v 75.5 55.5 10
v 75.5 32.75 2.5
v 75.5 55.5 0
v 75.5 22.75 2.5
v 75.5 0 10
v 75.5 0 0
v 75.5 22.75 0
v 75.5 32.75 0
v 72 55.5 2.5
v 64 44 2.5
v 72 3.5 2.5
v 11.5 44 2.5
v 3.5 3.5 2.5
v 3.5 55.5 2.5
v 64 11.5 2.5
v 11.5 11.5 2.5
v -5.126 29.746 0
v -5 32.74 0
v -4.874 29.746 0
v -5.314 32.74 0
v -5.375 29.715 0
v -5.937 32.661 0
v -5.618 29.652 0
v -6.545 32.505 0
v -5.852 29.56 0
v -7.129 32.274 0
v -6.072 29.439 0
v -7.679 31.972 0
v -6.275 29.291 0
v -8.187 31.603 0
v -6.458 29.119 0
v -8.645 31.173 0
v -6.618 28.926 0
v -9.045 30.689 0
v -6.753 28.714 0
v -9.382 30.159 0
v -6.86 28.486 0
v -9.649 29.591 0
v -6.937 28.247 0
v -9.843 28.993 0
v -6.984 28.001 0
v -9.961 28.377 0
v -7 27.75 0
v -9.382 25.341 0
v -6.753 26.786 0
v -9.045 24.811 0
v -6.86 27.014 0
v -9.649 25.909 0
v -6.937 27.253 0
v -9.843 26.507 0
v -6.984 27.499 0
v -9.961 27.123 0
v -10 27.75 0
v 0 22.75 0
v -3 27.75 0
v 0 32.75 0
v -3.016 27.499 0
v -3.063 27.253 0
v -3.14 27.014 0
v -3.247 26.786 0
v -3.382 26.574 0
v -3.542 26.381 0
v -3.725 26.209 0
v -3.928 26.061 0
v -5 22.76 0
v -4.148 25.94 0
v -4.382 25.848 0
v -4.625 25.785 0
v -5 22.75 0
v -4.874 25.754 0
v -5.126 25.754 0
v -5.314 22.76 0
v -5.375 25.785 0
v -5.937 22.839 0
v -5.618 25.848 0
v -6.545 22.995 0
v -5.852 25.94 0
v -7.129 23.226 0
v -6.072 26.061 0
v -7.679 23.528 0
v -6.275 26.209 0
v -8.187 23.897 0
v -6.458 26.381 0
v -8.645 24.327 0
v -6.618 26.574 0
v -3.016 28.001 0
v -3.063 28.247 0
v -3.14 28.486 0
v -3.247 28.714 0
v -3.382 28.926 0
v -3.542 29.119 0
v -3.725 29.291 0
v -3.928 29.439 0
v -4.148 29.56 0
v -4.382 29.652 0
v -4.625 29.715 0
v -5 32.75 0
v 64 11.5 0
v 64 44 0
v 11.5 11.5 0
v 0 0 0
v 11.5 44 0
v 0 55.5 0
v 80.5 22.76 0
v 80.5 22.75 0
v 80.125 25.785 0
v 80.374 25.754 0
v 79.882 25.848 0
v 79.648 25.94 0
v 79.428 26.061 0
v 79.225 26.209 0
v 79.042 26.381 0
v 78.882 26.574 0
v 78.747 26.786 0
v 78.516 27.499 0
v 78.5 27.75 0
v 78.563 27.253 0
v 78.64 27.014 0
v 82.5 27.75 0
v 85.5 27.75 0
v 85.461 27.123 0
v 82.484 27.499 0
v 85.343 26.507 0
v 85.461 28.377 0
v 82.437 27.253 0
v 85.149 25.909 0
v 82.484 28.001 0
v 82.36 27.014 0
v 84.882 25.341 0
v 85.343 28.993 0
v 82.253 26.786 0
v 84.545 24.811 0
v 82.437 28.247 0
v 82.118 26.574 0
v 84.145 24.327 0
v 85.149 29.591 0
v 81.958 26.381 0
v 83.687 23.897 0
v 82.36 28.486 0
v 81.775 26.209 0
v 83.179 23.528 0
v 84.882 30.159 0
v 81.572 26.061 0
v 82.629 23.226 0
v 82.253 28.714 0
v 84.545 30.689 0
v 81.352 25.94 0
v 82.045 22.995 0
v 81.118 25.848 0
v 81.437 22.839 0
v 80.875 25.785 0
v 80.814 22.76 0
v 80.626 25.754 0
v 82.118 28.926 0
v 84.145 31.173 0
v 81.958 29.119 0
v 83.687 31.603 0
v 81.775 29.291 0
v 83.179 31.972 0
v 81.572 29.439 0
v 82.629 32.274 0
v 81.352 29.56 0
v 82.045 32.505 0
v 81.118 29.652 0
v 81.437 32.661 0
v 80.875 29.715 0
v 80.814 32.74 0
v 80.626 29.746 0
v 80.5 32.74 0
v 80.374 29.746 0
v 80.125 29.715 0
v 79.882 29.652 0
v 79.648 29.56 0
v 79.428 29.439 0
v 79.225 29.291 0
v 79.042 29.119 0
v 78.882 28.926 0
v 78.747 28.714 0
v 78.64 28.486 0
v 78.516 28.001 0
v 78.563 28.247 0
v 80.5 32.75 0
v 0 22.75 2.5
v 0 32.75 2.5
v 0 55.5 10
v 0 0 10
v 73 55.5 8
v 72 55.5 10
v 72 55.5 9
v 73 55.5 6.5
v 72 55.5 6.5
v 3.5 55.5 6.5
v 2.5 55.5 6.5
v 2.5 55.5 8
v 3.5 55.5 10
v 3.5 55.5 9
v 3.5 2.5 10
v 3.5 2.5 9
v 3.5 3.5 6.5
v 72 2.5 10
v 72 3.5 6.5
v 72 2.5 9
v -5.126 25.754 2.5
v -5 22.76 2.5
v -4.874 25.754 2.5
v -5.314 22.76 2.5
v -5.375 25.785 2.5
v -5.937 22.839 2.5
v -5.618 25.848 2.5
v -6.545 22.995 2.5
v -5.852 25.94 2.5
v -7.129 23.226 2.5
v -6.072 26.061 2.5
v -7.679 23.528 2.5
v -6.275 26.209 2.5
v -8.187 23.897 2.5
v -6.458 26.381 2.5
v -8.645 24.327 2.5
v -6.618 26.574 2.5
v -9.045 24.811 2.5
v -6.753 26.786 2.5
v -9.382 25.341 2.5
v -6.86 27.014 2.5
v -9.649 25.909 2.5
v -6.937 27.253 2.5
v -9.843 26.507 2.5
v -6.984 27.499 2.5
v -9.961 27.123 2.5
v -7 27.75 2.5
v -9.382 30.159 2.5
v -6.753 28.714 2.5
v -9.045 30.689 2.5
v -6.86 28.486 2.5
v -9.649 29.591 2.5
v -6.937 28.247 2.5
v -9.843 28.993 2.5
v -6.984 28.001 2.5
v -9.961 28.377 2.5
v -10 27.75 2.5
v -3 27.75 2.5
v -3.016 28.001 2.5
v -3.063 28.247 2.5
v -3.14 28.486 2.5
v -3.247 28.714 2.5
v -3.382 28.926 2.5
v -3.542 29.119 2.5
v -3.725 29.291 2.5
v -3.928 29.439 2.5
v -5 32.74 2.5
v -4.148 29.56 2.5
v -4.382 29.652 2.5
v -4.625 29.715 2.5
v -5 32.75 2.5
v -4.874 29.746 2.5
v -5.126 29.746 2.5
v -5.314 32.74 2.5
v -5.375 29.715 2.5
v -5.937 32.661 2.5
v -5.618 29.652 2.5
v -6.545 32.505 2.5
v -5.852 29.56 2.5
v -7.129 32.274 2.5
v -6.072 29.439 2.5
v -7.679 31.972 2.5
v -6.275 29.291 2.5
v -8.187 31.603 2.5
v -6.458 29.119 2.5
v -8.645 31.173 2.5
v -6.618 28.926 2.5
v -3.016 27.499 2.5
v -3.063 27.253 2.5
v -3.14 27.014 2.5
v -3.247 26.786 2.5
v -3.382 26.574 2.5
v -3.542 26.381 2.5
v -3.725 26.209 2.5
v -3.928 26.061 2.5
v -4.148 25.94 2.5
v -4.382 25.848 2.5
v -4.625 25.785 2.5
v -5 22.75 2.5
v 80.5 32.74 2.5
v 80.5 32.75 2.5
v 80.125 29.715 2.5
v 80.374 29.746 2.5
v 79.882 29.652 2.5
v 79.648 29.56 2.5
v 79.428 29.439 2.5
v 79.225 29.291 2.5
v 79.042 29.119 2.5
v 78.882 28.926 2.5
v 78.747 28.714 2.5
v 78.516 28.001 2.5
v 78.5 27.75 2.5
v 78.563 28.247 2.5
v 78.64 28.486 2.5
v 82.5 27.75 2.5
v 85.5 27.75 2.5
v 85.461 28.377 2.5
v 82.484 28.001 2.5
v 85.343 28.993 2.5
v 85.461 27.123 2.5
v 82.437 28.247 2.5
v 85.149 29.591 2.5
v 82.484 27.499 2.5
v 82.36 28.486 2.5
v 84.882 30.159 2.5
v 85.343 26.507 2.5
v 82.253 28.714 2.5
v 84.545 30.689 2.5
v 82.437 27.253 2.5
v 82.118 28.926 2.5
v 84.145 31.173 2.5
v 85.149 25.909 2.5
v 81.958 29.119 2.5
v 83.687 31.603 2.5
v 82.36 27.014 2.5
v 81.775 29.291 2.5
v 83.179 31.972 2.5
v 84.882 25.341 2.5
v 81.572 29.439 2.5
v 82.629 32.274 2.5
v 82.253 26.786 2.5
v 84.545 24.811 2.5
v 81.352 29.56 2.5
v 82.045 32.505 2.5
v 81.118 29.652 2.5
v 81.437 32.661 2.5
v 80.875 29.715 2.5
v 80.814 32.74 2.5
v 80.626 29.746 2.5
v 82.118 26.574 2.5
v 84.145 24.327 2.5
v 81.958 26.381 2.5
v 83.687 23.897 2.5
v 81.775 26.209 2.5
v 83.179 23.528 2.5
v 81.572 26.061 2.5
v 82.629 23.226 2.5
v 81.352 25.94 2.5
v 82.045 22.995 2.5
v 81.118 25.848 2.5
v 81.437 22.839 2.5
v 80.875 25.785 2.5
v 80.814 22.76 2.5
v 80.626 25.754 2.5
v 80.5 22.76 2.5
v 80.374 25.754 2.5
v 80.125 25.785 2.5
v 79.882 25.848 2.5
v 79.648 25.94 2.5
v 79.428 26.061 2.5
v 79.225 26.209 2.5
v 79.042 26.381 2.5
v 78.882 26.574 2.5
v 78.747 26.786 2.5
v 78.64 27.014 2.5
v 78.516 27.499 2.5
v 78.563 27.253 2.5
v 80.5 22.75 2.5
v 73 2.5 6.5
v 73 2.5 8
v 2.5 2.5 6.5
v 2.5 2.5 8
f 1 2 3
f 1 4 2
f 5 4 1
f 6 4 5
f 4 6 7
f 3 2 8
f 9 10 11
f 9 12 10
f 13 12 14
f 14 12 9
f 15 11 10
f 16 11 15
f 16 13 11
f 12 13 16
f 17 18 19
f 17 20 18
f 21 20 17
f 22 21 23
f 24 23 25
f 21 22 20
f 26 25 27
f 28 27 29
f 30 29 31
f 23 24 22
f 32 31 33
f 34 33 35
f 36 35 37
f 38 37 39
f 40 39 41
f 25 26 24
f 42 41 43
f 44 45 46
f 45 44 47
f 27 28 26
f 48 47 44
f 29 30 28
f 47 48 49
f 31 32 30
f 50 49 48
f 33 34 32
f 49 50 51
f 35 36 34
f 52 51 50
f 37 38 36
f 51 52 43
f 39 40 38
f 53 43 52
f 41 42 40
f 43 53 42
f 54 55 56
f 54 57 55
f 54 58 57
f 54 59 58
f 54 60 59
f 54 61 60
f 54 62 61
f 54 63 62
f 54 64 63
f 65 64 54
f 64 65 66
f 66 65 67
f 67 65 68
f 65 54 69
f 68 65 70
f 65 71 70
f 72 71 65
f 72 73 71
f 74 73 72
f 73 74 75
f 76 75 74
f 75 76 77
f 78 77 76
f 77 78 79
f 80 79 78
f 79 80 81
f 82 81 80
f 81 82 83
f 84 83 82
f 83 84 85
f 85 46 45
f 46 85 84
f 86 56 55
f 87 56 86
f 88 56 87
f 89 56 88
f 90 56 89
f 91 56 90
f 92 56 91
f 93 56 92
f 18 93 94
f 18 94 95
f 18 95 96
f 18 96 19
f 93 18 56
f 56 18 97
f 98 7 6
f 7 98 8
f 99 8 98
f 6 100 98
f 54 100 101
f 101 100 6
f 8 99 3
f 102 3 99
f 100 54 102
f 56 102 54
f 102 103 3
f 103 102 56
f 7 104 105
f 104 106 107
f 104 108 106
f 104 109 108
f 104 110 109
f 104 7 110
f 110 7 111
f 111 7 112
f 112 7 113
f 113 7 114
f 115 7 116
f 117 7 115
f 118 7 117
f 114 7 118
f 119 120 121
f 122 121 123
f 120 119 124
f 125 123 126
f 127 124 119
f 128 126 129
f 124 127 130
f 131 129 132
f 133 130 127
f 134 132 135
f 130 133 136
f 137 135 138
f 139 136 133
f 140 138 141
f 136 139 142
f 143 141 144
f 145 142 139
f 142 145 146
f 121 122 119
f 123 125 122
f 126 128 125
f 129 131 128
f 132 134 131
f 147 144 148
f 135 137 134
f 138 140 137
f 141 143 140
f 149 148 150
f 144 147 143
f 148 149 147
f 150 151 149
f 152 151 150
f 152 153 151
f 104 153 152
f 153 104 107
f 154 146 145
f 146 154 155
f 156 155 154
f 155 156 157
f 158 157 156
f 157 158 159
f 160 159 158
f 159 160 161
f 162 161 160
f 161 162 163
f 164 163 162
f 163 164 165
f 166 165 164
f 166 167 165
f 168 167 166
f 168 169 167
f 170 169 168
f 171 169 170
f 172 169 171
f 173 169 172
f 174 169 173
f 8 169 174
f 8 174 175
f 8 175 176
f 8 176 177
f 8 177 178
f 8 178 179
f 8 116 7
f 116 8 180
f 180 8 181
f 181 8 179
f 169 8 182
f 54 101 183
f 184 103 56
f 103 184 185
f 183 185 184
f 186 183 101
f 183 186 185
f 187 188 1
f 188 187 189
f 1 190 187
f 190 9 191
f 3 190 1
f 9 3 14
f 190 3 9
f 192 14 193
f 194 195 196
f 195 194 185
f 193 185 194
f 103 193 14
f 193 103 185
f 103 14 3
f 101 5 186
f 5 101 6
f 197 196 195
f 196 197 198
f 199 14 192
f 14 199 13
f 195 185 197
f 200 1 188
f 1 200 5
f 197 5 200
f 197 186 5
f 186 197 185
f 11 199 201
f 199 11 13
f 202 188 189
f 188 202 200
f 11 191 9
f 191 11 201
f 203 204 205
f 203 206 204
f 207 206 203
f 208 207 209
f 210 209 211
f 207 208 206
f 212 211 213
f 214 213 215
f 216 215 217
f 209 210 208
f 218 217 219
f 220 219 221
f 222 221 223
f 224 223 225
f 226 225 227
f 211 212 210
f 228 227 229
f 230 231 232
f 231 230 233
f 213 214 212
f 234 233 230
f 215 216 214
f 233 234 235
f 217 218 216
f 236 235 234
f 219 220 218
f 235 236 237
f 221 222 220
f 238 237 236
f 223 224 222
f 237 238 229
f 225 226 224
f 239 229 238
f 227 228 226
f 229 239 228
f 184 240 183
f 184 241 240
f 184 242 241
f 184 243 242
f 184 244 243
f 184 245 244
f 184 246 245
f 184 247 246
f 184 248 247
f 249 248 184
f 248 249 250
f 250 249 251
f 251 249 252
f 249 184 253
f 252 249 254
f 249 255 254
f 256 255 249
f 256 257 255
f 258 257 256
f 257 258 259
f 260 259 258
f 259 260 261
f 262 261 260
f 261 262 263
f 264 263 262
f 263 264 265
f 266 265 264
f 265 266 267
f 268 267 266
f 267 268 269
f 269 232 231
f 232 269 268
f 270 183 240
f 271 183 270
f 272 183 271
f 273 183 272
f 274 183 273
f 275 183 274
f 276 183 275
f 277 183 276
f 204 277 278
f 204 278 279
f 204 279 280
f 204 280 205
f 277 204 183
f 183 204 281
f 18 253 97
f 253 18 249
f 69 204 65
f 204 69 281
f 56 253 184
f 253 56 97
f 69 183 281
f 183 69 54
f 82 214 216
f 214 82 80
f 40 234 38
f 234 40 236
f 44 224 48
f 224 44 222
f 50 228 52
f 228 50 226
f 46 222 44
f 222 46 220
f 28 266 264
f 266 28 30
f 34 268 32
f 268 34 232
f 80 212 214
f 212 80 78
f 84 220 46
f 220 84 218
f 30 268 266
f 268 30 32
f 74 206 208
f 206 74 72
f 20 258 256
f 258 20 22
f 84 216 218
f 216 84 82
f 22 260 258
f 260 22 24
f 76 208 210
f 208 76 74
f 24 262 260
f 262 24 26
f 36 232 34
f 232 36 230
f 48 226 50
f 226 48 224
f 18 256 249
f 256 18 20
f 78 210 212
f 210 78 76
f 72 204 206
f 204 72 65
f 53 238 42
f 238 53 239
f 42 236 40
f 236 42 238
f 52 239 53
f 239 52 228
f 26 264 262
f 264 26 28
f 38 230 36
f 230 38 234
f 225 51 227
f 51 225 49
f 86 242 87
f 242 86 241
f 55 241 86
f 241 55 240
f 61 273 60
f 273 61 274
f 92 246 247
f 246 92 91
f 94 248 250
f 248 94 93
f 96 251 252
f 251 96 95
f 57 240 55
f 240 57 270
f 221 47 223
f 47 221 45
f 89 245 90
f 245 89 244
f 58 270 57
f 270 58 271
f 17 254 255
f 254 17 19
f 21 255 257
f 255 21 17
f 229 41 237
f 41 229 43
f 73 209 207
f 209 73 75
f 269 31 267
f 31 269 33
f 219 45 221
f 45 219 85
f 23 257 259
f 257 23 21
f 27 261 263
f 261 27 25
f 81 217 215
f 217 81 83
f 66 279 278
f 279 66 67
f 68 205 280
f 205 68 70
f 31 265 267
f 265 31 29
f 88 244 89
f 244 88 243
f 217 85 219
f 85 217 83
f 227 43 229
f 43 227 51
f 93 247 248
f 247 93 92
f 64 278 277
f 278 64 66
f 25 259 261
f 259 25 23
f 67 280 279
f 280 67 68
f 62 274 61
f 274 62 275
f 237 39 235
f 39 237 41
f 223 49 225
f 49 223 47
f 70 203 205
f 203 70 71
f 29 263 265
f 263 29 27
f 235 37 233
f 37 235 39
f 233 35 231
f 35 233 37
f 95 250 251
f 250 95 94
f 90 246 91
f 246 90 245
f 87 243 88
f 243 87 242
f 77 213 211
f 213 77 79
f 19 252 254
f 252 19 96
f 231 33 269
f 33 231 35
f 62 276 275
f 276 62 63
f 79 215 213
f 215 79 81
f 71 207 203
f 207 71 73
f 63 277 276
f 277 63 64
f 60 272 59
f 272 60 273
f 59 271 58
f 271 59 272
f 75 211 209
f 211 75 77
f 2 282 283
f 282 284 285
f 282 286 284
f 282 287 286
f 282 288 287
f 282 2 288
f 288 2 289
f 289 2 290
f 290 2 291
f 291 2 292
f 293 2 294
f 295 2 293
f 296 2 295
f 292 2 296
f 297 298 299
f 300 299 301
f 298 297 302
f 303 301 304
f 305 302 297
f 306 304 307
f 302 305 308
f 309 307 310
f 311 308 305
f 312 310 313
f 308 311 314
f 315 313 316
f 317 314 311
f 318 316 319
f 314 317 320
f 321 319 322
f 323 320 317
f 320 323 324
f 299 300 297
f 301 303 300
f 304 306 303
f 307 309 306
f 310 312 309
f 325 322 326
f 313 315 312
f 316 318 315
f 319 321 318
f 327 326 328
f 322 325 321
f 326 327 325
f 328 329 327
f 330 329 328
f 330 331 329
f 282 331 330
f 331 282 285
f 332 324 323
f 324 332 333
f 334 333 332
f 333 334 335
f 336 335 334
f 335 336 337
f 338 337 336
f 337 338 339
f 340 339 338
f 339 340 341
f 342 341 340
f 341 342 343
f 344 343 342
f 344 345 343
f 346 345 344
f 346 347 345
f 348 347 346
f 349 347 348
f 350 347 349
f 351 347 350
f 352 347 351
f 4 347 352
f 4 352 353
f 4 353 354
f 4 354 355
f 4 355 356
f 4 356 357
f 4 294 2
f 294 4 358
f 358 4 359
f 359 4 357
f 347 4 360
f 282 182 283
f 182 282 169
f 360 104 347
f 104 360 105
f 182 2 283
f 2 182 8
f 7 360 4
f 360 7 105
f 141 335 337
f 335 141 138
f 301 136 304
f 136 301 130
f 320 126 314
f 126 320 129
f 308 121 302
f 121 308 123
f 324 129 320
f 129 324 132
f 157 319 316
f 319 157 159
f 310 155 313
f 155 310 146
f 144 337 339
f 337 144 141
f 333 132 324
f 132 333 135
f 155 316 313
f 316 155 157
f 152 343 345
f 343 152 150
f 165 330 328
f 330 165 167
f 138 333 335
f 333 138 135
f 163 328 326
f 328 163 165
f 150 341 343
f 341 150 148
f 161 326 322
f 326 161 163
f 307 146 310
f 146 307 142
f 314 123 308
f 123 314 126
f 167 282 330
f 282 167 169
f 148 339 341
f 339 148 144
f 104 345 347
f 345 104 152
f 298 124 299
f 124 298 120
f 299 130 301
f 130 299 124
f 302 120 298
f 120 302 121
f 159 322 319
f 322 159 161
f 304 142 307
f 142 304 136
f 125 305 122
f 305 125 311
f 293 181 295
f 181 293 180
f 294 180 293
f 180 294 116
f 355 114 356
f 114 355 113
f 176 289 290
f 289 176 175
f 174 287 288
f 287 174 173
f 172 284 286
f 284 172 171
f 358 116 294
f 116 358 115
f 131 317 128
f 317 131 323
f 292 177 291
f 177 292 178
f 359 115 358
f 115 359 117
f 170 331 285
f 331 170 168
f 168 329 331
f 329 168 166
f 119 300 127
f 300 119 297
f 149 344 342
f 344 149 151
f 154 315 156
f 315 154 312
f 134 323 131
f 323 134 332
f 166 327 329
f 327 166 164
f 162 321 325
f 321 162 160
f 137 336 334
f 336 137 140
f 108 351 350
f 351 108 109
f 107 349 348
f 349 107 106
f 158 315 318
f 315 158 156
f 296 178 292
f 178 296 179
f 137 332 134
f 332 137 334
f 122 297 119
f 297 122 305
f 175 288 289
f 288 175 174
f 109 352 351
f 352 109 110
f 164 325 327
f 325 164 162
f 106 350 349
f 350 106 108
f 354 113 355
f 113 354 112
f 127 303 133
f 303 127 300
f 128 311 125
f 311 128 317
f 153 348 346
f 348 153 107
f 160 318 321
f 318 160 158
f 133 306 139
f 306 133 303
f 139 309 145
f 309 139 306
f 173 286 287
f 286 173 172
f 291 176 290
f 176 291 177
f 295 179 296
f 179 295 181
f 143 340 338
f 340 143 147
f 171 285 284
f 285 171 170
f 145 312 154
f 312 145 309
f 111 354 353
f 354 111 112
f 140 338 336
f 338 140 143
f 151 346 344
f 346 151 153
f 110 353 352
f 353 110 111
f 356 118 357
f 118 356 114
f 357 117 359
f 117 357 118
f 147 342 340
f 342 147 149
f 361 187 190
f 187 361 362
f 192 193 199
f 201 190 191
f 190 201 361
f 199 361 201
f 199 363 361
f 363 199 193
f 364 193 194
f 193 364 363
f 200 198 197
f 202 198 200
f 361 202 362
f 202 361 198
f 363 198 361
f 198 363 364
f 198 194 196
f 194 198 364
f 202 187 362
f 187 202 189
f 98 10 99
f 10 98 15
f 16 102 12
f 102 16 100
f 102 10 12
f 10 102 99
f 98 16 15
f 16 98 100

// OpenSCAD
/* bluetooth_mate_holder.scad
 * By John Biehler - November 17, 2011
 * http://www.thingiverse.com/thing: 

 * derived from pcb_box_slide_with_tabs.scad
 * By Nicholas C Lewis - Jan 1, 2011
 * http://www.thingiverse.com/thing:5396 
 *
 * derived from pcb_box_slide.scad 
 *     Parametric, open PCB-box (slide-in) by chlunde
 *     http://www.thingiverse.com/thing:4071
 *
 * CHANGES
 * - adjusted to fit Arduino Mega
 * - added mounting tabs
 * - turned off cutouts
 * - adjusted bottom cutout size
 */

$fn = 50;

//Uno is 2.7" x 2.1" which is 68.58 mm x 53.34 mm
//Round up to 69 mm x 54 mm
pcb_width = 70.5;
pcb_length = 50.5;
pcb_height =1.5;
slisse = 1;

pcb_bottom_margin = 4;
wall_width_thick = 3.5;
wall_width = wall_width_thick-slisse;
box_height = 10;

//tab parameters
tab_hole_radius=2;
tab_outer_radius=5;



module tab() {
	difference(){
		union() {
			translate([-tab_outer_radius,-tab_outer_radius,0])
			cube([tab_outer_radius,2*tab_outer_radius,wall_width]);
			translate([-tab_outer_radius,0,0])
				cylinder(r=tab_outer_radius, h = wall_width);
		}
		translate([-tab_outer_radius,0,0])
		 cylinder(r= tab_hole_radius, h = wall_width+3,center=true);
	}

}

module box() {
  union() {
    cube([pcb_width + 2*wall_width, pcb_length + 2*wall_width, wall_width]);

    cube([wall_width_thick, pcb_length + 2*wall_width, box_height]);

    cube([pcb_width + 2*wall_width, wall_width_thick, box_height]);

    %translate([0, pcb_length+wall_width, 0])
      cube([pcb_width + 2*wall_width,wall_width,box_height]);

    translate([pcb_width + wall_width - slisse,0,0])
      cube([wall_width_thick, pcb_length + 2*wall_width, box_height]);
  }
//comment out this part to remove tabs
 for(i=[(pcb_length + 2*wall_width)/2]){
	translate([0,i,0])tab();
	translate([pcb_width + 2*wall_width,i,0])mirror()tab();
 }


}

module pcb() {
  translate([wall_width, wall_width, wall_width + pcb_bottom_margin])
    cube([pcb_width,pcb_length + wall_width + 0.1,pcb_height]);
  translate([wall_width, wall_width, wall_width + pcb_bottom_margin+pcb_height])rotate([0,45,0])
    cube([pcb_height,pcb_length + wall_width + 0.1,pcb_height]);
  translate([wall_width+pcb_width-2*cos(45)*pcb_height, wall_width, wall_width + pcb_bottom_margin+pcb_height])rotate([0,45,0])
    cube([pcb_height,pcb_length + wall_width + 0.1,pcb_height]);
  translate([wall_width_thick, wall_width, wall_width + pcb_bottom_margin])
    cube([pcb_width-2*slisse,pcb_length + wall_width + 0.1,box_height]);

}



module holes() {
  *translate([wall_width + pcb_width/2, wall_width_thick + 0.1, pcb_width/2+wall_width])
    rotate(a=90,v=[1,0,0])
      cylinder(r=pcb_width/2, h=wall_width_thick + 0.2);

  *translate([-0.1, wall_width + pcb_length/2, pcb_length/2 + wall_width])
    rotate(a=90,v=[0,1,0])
      cylinder(r=pcb_length/2, h=wall_width_thick + 0.2);

  *translate([pcb_width + wall_width - slisse - 0.1, wall_width + pcb_length/2, pcb_length/2 + wall_width])
    rotate(a=90,v=[0,1,0])
      cylinder(r=pcb_length/2, h=wall_width_thick + 0.2);

 * translate([pcb_width/2 + wall_width, wall_width + pcb_length/2, -0.1])
    rotate(a=0,v=[0,1,0])
      cylinder(r=min(pcb_length,pcb_width)/2 - wall_width/2, h=wall_width_thick + 0.2);
   
  inner_margin = 9;
  translate([inner_margin +wall_width, inner_margin+wall_width, -0.1])
    cube([pcb_width-inner_margin*2,pcb_length -inner_margin*2,wall_width + 0.2]);
}

difference() {
  box();
  pcb();
  holes();
}

* color([1,0,0])
  translate([pcb_width/2 + wall_width, wall_width + pcb_length/2, -0.1])
    rotate(a=0,v=[0,1,0])
      cylinder(r=min(pcb_length,pcb_width)/2 - wall_width/2, h=wall_width_thick + 0.2);
